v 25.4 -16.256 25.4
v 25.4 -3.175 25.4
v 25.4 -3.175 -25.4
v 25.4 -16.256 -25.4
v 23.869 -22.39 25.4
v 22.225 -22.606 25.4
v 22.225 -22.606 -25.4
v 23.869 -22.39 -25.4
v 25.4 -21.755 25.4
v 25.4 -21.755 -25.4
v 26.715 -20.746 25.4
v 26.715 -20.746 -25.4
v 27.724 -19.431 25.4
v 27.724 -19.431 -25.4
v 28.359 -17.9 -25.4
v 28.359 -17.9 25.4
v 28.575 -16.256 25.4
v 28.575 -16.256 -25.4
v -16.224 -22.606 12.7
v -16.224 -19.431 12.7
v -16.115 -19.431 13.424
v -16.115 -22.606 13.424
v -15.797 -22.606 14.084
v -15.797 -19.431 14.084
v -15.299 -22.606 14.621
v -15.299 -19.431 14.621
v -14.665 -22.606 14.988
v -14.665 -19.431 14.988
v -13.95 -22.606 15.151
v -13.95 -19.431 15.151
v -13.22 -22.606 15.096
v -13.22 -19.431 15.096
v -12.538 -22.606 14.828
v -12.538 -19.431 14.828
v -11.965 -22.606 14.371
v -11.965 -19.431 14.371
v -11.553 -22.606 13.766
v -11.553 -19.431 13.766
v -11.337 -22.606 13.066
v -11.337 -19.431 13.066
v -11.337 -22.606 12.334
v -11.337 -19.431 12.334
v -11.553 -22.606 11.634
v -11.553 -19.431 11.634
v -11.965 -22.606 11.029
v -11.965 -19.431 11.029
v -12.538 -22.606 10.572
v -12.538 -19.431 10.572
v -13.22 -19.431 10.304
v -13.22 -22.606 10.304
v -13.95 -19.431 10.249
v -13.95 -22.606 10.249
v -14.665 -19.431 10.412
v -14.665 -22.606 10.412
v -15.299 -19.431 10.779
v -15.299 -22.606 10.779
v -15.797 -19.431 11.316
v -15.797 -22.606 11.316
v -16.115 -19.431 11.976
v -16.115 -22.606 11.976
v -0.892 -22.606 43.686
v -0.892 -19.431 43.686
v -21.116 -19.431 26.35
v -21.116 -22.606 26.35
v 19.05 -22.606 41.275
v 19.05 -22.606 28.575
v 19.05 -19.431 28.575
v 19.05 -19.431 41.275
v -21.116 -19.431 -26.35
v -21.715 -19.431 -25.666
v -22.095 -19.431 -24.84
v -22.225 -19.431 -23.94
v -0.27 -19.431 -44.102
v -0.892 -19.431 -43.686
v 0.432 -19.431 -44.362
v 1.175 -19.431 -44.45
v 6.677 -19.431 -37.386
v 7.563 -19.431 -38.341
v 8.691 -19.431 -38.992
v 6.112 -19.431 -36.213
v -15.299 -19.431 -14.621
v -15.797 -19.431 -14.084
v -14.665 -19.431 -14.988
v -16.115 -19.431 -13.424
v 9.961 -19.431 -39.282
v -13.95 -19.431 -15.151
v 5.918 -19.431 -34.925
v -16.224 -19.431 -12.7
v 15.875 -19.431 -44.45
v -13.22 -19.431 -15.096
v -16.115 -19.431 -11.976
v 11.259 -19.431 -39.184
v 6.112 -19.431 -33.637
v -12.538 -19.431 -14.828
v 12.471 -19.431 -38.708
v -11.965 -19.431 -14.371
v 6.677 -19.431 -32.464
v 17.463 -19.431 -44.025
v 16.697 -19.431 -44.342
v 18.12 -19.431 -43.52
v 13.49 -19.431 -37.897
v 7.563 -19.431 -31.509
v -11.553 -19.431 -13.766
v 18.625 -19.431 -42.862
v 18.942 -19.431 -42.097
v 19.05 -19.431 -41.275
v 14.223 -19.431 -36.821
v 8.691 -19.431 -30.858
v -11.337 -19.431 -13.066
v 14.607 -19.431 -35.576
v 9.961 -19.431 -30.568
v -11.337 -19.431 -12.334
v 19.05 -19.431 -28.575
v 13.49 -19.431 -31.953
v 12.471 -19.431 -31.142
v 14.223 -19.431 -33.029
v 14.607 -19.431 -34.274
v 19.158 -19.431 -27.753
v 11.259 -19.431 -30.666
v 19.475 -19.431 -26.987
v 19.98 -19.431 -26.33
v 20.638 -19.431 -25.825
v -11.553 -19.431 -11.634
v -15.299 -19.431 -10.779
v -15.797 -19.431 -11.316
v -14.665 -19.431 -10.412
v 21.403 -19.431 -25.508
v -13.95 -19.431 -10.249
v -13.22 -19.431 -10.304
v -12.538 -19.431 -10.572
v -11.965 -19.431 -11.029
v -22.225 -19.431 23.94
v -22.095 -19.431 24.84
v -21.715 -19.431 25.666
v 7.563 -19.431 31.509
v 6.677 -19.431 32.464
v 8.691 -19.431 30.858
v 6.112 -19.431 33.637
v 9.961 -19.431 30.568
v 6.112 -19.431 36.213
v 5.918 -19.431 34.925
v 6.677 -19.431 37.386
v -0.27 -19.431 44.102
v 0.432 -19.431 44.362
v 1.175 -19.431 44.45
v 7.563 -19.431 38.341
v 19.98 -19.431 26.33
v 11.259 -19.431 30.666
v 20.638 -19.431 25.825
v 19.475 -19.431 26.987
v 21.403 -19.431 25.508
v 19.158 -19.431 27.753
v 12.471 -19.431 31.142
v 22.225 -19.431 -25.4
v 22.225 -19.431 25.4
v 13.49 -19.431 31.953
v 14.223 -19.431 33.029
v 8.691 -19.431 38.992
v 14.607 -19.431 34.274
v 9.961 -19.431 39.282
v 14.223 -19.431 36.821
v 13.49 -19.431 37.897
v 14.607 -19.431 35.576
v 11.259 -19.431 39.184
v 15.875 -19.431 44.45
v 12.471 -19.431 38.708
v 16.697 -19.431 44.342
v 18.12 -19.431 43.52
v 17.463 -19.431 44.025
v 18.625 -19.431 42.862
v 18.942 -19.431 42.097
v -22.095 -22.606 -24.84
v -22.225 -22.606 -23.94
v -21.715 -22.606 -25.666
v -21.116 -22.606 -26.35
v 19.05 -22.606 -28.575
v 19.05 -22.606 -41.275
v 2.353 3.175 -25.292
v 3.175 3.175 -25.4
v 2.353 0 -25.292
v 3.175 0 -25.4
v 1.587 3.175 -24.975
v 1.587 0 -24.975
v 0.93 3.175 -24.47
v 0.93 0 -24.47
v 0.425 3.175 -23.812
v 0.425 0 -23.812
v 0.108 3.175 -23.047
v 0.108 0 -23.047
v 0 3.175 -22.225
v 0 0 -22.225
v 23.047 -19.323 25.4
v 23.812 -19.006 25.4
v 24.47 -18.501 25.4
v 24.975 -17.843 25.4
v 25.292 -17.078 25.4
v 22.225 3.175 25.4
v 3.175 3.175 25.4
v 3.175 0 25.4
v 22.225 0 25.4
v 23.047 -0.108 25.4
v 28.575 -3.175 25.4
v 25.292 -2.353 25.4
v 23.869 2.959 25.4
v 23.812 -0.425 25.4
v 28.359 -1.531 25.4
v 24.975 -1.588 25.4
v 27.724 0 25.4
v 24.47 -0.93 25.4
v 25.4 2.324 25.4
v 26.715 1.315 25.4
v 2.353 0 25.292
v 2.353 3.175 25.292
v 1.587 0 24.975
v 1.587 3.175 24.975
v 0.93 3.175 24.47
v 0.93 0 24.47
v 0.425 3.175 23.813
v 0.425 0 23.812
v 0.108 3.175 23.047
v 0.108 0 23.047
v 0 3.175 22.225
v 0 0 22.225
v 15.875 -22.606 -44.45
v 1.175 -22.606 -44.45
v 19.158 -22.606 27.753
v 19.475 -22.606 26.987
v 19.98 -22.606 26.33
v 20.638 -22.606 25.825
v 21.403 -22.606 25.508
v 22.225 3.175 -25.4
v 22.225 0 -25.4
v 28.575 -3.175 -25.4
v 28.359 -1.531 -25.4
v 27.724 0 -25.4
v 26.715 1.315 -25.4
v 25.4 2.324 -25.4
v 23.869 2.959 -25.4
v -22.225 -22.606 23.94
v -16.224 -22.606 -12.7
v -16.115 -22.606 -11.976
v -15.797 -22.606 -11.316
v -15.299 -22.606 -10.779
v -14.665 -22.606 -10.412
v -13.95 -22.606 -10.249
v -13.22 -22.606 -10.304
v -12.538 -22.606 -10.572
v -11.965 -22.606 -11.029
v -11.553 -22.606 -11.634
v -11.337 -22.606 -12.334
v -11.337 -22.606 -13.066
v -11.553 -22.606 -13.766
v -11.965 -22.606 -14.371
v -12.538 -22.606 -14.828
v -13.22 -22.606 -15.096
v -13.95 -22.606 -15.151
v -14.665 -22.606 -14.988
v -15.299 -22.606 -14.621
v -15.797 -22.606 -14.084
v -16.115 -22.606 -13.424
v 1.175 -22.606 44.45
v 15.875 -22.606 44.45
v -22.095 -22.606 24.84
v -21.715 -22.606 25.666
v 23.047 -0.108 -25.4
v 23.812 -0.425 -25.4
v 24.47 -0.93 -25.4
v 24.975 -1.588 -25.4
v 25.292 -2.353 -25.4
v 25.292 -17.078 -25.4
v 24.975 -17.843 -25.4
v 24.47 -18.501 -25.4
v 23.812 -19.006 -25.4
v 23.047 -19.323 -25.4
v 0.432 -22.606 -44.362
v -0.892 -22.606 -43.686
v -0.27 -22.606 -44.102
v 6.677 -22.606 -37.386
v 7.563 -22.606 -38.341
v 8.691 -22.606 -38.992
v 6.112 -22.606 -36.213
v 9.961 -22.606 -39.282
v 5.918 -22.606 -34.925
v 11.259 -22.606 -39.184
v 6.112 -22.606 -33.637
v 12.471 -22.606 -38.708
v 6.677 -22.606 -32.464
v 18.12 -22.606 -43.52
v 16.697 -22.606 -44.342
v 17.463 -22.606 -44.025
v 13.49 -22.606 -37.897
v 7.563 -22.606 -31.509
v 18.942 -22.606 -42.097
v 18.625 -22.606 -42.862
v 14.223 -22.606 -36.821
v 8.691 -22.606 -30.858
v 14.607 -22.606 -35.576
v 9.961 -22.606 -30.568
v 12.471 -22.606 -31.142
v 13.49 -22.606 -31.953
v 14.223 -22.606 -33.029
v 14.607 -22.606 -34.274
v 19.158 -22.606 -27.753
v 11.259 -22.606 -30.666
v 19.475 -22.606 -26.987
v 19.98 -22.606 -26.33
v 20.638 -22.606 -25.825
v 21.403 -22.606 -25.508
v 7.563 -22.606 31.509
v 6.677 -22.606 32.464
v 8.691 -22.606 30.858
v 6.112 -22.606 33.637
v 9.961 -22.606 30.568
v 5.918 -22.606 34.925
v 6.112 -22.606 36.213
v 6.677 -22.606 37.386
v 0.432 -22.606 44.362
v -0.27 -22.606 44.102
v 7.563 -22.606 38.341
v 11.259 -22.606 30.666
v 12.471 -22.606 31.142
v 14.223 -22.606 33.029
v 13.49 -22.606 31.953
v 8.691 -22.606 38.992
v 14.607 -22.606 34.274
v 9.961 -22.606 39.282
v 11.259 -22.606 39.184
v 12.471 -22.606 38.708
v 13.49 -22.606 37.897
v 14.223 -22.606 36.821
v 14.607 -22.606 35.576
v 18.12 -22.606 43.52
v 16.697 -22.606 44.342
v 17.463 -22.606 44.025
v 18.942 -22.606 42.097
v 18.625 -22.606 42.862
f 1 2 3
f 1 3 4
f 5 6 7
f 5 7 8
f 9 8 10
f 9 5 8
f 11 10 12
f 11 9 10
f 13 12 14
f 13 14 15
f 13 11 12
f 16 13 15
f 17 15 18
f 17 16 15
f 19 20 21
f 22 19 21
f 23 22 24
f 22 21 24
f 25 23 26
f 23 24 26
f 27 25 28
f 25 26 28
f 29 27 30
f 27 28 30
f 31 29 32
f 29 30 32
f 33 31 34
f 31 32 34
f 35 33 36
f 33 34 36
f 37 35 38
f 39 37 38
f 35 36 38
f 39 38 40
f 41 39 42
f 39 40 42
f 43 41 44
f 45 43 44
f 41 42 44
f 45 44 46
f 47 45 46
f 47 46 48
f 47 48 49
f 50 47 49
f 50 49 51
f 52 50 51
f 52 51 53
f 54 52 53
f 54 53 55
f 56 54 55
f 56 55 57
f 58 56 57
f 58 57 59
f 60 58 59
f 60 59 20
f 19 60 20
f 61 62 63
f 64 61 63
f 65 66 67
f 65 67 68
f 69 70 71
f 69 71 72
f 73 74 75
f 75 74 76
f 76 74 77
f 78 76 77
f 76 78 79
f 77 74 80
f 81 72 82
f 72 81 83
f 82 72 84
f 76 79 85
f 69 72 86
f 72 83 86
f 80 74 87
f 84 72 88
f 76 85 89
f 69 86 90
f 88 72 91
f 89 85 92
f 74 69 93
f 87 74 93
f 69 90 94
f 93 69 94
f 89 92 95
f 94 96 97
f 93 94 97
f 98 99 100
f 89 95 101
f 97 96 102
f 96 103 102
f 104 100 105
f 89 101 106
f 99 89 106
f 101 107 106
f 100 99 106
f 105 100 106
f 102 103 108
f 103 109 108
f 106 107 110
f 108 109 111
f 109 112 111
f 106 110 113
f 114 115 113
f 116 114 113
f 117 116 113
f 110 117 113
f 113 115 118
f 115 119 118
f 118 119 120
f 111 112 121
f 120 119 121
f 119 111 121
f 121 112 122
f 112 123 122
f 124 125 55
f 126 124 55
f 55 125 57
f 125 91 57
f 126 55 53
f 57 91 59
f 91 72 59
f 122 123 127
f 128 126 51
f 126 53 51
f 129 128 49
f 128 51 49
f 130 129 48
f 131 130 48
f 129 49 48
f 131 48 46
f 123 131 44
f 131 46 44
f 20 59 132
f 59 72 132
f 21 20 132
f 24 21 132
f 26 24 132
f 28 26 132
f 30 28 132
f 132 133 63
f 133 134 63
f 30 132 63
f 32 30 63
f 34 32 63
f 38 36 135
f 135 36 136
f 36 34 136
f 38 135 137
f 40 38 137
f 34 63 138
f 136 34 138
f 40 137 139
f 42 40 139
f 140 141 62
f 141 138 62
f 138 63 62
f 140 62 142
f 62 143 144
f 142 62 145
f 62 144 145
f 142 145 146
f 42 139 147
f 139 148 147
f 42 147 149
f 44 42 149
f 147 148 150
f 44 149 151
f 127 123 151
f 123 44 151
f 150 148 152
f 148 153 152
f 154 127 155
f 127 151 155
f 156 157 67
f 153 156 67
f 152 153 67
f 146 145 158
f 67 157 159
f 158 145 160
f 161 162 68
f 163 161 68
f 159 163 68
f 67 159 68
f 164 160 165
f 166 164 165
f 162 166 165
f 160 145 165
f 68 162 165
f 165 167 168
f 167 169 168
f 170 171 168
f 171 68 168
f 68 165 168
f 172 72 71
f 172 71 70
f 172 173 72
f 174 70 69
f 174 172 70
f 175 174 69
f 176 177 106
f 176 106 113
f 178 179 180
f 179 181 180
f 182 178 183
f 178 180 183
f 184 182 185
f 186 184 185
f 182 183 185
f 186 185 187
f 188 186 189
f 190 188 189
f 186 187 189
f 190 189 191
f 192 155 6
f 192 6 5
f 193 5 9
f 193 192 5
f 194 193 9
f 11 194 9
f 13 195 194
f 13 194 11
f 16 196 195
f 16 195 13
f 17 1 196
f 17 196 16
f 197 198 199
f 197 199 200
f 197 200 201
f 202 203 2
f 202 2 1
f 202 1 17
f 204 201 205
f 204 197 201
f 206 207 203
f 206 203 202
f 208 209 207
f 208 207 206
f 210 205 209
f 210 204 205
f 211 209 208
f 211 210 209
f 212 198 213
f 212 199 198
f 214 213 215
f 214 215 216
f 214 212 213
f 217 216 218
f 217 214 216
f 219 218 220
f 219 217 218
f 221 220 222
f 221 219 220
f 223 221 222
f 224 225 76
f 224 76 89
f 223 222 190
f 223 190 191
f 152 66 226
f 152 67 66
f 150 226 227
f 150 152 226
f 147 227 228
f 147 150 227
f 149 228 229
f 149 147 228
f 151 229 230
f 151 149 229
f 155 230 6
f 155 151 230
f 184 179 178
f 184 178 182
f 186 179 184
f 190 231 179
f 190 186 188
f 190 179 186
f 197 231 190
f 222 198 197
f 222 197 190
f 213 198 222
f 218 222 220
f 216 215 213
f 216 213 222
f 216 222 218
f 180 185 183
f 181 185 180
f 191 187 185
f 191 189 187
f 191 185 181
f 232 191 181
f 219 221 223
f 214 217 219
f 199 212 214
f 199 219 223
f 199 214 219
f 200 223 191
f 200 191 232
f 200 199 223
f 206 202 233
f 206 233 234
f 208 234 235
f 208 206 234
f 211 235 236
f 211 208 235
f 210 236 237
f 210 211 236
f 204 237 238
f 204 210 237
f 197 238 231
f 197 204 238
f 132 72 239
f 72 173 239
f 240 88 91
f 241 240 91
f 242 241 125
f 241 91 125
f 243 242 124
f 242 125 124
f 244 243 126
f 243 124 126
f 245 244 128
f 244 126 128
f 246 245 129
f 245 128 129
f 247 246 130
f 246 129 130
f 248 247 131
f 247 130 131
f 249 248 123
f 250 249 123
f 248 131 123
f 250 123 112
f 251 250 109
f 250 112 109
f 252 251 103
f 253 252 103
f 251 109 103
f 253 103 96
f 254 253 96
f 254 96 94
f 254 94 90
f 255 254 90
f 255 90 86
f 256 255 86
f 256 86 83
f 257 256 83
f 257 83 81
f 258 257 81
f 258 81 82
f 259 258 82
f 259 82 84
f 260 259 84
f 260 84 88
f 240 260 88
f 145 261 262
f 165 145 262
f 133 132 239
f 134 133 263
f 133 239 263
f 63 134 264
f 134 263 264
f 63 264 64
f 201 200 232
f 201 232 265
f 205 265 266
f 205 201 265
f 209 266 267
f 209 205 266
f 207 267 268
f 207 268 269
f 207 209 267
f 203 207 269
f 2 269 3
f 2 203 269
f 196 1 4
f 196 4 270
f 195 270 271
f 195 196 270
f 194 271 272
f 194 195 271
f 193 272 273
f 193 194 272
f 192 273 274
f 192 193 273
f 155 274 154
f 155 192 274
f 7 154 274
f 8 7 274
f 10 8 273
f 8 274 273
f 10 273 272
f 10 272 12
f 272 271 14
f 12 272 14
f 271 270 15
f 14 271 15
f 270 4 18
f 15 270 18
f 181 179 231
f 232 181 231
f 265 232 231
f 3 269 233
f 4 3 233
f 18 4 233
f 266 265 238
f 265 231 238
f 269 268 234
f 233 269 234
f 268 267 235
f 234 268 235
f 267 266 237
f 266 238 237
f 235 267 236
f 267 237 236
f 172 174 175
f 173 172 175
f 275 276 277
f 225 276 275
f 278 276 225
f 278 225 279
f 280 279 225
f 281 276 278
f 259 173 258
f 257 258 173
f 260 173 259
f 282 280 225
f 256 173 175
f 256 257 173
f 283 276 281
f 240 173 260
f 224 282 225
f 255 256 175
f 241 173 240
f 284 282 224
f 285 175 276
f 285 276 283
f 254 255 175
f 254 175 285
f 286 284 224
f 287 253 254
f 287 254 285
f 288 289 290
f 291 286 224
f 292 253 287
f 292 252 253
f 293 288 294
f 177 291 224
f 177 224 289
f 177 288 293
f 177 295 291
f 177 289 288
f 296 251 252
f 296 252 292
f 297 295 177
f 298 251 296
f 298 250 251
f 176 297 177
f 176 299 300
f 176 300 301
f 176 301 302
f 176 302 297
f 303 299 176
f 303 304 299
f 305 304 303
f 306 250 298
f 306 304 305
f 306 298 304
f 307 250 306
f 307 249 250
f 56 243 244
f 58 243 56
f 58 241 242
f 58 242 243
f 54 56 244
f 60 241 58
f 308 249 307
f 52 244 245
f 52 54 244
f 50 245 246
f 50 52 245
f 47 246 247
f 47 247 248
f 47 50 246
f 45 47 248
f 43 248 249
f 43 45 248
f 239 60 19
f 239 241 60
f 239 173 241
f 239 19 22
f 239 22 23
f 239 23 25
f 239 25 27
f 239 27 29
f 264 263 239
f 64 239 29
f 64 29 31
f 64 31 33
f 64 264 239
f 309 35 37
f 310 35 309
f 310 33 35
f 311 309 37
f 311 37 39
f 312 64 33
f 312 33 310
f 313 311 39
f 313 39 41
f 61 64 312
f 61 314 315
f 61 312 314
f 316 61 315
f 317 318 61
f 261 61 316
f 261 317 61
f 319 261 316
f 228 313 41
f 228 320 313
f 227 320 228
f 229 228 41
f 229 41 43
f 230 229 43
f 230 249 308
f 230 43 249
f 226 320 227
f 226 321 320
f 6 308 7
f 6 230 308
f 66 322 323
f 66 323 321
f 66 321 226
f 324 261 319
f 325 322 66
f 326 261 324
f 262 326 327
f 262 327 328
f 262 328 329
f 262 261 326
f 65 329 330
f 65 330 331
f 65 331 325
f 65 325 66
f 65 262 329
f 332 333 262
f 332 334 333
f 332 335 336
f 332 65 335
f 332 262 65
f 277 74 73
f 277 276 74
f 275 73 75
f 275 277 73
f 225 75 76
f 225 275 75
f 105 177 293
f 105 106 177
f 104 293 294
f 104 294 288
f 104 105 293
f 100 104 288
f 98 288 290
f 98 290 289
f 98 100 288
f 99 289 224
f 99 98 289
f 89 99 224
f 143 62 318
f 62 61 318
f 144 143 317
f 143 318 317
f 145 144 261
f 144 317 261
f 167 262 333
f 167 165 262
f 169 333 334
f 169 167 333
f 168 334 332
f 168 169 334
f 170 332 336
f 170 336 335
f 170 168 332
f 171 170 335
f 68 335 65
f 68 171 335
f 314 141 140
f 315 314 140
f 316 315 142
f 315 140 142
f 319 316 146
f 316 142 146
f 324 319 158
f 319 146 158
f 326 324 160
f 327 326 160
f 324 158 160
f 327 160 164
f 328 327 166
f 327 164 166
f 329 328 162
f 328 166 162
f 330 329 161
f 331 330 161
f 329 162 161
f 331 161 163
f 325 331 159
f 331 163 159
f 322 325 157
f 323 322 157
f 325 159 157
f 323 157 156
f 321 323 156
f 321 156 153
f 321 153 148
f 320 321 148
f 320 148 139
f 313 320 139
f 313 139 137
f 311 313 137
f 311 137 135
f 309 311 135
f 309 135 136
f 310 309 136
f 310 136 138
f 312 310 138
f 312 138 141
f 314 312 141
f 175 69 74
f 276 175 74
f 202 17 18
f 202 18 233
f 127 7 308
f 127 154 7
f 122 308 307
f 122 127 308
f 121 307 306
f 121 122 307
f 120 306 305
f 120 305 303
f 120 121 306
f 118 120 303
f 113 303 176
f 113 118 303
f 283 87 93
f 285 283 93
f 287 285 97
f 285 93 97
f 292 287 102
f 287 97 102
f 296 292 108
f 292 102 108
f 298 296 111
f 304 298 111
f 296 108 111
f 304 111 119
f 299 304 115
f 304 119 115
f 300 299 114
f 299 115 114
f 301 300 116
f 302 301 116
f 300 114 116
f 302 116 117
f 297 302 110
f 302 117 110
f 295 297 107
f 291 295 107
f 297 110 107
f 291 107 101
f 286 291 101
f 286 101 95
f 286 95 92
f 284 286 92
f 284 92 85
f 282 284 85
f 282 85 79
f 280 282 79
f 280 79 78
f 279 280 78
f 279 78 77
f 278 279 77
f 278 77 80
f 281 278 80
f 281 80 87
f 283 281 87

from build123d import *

# Parameters (mm, degrees)
BASE_FLANGE1_DEPTH  = 25.4
SKETCH7_W           = 41.275
SKETCH7_H           = 19.05
BOSS_EXTRUDE1_DEPTH = 3.175
SKETCH6_R           = 2.45745
SKETCH6_R_2         = 4.3688
CUT_EXTRUDE1_DEPTH  = 58.474902009
CUT_EXTRUDE2_DEPTH  = 58.474902009
FILLET1_R           = 3.175


# Sheet-metal steps are written as plain solids
with BuildPart() as part:
    # Sketch1 → Base-Flange1 (new, symmetric)
    with BuildSketch(Plane.XY):
        with BuildLine():
            Line((0, 0), (22.225, 0))
            ThreePointArc((22.225, 0), (24.47006403, -0.92993597), (25.4, -3.175))
            Line((25.4, -3.175), (25.4, -16.256))
            ThreePointArc((25.4, -16.256), (24.47006403, -18.50106403), (22.225, -19.431))
            Line((22.225, -19.431), (-22.225, -19.431))
            Line((-22.225, -19.431), (-22.225, -22.606))
            Line((-22.225, -22.606), (22.225, -22.606))
            ThreePointArc((22.225, -22.606), (26.715128061, -20.746128061), (28.575, -16.256))
            Line((28.575, -16.256), (28.575, -3.175))
            ThreePointArc((28.575, -3.175), (26.715128061, 1.315128061), (22.225, 3.175))
            Line((22.225, 3.175), (0, 3.175))
            Line((0, 3.175), (0, 0))
        make_face()
    extrude(amount=BASE_FLANGE1_DEPTH, both=True)

    # Sketch7 → Boss-Extrude1 (add)
    with BuildSketch(Plane.XZ.offset(22.606)):
        with Locations((-1.5875, 34.925)):
            Rectangle(SKETCH7_W, SKETCH7_H)
        with Locations((-1.5875, -34.925)):
            Rectangle(SKETCH7_W, SKETCH7_H)
    extrude(amount=-BOSS_EXTRUDE1_DEPTH)

    # Sketch6 → Cut-Extrude1 (cut, through all)
    with BuildSketch(Plane(origin=(0, -19.431, 0), x_dir=(1, 0, 0), z_dir=(0, 1, 0))):
        with Locations(Location((-13.7668, 12.7, 0), (0, 0, 180))):
            Circle(SKETCH6_R)
        with Locations(Location((-13.7668, -12.7, 0), (0, 0, 180))):
            Circle(SKETCH6_R)
        with Locations(Location((10.287, -34.925, 0), (0, 0, 180))):
            Circle(SKETCH6_R_2)
        with Locations(Location((10.287, 34.925, 0), (0, 0, 180))):
            Circle(SKETCH6_R_2)
    extrude(amount=-CUT_EXTRUDE1_DEPTH, mode=Mode.SUBTRACT)

    # Sketch8 → Cut-Extrude2 (cut, through all)
    with BuildSketch(Plane(origin=(0, -19.431, 0), x_dir=(1, 0, 0), z_dir=(0, 1, 0))):
        Polygon((0, -44.45), (-22.225, -25.4), (-22.225, -44.45), align=None)
        Polygon((-22.225, 44.45), (-22.225, 25.4), (0, 44.45), align=None)
    extrude(amount=-CUT_EXTRUDE2_DEPTH, mode=Mode.SUBTRACT)

    # Fillet1
    fillet1_edges = [part.edges().sort_by_distance(p)[0] for p in [
        (0, 1.5875, -25.4),
        (0, 1.5875, 25.4),
        (19.05, -21.0185, -25.4),
        (19.05, -21.0185, -44.45),
        (19.05, -21.0185, 25.4),
        (19.05, -21.0185, 44.45),
        (0, -21.0185, 44.45),
        (-22.225, -21.0185, 25.4),
        (0, -21.0185, -44.45),
        (-22.225, -21.0185, -25.4),
    ]]
    fillet(fillet1_edges, radius=FILLET1_R)


solid = part.part
